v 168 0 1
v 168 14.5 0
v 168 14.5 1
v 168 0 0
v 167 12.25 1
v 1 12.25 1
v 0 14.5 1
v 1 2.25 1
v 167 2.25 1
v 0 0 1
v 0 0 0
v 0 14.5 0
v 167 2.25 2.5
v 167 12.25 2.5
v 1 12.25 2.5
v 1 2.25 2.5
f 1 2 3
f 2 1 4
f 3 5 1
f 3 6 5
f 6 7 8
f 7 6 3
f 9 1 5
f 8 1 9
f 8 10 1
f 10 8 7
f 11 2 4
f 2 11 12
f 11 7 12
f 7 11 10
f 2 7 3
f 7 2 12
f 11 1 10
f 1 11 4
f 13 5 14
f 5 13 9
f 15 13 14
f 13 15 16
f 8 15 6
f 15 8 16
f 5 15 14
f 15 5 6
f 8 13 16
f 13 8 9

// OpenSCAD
/*
    lamp gekocht bij AlieExpress: 
    https://www.aliexpress.com/item/15w-Waterproof-DRL-Led-Daytime-Running-Light-Auto-Car-White-12V-Bar-Car-Light-Source-day/32782545088.html?spm=2114.13010608.0.0.hCMLfp

*/


lamp  = [168, 14.5,   1];
licht = [166, 10  , 1.5];

marge = 0.5;


lamp();

module lamp() {
    color("white")
        cube(lamp);
    
    color("yellow")
        translate([(lamp.x - licht.x) / 2, (lamp.y - licht.y) / 2, lamp.z])
            cube(licht);
}

module behuizing() {
    // 1 enkele strip
}

module bevestiging() {
    // hoe maken we de boel vast, en waaraan
}

module electronica() {
    // knop
    // 12V aansluiting
    // bedrading
}
